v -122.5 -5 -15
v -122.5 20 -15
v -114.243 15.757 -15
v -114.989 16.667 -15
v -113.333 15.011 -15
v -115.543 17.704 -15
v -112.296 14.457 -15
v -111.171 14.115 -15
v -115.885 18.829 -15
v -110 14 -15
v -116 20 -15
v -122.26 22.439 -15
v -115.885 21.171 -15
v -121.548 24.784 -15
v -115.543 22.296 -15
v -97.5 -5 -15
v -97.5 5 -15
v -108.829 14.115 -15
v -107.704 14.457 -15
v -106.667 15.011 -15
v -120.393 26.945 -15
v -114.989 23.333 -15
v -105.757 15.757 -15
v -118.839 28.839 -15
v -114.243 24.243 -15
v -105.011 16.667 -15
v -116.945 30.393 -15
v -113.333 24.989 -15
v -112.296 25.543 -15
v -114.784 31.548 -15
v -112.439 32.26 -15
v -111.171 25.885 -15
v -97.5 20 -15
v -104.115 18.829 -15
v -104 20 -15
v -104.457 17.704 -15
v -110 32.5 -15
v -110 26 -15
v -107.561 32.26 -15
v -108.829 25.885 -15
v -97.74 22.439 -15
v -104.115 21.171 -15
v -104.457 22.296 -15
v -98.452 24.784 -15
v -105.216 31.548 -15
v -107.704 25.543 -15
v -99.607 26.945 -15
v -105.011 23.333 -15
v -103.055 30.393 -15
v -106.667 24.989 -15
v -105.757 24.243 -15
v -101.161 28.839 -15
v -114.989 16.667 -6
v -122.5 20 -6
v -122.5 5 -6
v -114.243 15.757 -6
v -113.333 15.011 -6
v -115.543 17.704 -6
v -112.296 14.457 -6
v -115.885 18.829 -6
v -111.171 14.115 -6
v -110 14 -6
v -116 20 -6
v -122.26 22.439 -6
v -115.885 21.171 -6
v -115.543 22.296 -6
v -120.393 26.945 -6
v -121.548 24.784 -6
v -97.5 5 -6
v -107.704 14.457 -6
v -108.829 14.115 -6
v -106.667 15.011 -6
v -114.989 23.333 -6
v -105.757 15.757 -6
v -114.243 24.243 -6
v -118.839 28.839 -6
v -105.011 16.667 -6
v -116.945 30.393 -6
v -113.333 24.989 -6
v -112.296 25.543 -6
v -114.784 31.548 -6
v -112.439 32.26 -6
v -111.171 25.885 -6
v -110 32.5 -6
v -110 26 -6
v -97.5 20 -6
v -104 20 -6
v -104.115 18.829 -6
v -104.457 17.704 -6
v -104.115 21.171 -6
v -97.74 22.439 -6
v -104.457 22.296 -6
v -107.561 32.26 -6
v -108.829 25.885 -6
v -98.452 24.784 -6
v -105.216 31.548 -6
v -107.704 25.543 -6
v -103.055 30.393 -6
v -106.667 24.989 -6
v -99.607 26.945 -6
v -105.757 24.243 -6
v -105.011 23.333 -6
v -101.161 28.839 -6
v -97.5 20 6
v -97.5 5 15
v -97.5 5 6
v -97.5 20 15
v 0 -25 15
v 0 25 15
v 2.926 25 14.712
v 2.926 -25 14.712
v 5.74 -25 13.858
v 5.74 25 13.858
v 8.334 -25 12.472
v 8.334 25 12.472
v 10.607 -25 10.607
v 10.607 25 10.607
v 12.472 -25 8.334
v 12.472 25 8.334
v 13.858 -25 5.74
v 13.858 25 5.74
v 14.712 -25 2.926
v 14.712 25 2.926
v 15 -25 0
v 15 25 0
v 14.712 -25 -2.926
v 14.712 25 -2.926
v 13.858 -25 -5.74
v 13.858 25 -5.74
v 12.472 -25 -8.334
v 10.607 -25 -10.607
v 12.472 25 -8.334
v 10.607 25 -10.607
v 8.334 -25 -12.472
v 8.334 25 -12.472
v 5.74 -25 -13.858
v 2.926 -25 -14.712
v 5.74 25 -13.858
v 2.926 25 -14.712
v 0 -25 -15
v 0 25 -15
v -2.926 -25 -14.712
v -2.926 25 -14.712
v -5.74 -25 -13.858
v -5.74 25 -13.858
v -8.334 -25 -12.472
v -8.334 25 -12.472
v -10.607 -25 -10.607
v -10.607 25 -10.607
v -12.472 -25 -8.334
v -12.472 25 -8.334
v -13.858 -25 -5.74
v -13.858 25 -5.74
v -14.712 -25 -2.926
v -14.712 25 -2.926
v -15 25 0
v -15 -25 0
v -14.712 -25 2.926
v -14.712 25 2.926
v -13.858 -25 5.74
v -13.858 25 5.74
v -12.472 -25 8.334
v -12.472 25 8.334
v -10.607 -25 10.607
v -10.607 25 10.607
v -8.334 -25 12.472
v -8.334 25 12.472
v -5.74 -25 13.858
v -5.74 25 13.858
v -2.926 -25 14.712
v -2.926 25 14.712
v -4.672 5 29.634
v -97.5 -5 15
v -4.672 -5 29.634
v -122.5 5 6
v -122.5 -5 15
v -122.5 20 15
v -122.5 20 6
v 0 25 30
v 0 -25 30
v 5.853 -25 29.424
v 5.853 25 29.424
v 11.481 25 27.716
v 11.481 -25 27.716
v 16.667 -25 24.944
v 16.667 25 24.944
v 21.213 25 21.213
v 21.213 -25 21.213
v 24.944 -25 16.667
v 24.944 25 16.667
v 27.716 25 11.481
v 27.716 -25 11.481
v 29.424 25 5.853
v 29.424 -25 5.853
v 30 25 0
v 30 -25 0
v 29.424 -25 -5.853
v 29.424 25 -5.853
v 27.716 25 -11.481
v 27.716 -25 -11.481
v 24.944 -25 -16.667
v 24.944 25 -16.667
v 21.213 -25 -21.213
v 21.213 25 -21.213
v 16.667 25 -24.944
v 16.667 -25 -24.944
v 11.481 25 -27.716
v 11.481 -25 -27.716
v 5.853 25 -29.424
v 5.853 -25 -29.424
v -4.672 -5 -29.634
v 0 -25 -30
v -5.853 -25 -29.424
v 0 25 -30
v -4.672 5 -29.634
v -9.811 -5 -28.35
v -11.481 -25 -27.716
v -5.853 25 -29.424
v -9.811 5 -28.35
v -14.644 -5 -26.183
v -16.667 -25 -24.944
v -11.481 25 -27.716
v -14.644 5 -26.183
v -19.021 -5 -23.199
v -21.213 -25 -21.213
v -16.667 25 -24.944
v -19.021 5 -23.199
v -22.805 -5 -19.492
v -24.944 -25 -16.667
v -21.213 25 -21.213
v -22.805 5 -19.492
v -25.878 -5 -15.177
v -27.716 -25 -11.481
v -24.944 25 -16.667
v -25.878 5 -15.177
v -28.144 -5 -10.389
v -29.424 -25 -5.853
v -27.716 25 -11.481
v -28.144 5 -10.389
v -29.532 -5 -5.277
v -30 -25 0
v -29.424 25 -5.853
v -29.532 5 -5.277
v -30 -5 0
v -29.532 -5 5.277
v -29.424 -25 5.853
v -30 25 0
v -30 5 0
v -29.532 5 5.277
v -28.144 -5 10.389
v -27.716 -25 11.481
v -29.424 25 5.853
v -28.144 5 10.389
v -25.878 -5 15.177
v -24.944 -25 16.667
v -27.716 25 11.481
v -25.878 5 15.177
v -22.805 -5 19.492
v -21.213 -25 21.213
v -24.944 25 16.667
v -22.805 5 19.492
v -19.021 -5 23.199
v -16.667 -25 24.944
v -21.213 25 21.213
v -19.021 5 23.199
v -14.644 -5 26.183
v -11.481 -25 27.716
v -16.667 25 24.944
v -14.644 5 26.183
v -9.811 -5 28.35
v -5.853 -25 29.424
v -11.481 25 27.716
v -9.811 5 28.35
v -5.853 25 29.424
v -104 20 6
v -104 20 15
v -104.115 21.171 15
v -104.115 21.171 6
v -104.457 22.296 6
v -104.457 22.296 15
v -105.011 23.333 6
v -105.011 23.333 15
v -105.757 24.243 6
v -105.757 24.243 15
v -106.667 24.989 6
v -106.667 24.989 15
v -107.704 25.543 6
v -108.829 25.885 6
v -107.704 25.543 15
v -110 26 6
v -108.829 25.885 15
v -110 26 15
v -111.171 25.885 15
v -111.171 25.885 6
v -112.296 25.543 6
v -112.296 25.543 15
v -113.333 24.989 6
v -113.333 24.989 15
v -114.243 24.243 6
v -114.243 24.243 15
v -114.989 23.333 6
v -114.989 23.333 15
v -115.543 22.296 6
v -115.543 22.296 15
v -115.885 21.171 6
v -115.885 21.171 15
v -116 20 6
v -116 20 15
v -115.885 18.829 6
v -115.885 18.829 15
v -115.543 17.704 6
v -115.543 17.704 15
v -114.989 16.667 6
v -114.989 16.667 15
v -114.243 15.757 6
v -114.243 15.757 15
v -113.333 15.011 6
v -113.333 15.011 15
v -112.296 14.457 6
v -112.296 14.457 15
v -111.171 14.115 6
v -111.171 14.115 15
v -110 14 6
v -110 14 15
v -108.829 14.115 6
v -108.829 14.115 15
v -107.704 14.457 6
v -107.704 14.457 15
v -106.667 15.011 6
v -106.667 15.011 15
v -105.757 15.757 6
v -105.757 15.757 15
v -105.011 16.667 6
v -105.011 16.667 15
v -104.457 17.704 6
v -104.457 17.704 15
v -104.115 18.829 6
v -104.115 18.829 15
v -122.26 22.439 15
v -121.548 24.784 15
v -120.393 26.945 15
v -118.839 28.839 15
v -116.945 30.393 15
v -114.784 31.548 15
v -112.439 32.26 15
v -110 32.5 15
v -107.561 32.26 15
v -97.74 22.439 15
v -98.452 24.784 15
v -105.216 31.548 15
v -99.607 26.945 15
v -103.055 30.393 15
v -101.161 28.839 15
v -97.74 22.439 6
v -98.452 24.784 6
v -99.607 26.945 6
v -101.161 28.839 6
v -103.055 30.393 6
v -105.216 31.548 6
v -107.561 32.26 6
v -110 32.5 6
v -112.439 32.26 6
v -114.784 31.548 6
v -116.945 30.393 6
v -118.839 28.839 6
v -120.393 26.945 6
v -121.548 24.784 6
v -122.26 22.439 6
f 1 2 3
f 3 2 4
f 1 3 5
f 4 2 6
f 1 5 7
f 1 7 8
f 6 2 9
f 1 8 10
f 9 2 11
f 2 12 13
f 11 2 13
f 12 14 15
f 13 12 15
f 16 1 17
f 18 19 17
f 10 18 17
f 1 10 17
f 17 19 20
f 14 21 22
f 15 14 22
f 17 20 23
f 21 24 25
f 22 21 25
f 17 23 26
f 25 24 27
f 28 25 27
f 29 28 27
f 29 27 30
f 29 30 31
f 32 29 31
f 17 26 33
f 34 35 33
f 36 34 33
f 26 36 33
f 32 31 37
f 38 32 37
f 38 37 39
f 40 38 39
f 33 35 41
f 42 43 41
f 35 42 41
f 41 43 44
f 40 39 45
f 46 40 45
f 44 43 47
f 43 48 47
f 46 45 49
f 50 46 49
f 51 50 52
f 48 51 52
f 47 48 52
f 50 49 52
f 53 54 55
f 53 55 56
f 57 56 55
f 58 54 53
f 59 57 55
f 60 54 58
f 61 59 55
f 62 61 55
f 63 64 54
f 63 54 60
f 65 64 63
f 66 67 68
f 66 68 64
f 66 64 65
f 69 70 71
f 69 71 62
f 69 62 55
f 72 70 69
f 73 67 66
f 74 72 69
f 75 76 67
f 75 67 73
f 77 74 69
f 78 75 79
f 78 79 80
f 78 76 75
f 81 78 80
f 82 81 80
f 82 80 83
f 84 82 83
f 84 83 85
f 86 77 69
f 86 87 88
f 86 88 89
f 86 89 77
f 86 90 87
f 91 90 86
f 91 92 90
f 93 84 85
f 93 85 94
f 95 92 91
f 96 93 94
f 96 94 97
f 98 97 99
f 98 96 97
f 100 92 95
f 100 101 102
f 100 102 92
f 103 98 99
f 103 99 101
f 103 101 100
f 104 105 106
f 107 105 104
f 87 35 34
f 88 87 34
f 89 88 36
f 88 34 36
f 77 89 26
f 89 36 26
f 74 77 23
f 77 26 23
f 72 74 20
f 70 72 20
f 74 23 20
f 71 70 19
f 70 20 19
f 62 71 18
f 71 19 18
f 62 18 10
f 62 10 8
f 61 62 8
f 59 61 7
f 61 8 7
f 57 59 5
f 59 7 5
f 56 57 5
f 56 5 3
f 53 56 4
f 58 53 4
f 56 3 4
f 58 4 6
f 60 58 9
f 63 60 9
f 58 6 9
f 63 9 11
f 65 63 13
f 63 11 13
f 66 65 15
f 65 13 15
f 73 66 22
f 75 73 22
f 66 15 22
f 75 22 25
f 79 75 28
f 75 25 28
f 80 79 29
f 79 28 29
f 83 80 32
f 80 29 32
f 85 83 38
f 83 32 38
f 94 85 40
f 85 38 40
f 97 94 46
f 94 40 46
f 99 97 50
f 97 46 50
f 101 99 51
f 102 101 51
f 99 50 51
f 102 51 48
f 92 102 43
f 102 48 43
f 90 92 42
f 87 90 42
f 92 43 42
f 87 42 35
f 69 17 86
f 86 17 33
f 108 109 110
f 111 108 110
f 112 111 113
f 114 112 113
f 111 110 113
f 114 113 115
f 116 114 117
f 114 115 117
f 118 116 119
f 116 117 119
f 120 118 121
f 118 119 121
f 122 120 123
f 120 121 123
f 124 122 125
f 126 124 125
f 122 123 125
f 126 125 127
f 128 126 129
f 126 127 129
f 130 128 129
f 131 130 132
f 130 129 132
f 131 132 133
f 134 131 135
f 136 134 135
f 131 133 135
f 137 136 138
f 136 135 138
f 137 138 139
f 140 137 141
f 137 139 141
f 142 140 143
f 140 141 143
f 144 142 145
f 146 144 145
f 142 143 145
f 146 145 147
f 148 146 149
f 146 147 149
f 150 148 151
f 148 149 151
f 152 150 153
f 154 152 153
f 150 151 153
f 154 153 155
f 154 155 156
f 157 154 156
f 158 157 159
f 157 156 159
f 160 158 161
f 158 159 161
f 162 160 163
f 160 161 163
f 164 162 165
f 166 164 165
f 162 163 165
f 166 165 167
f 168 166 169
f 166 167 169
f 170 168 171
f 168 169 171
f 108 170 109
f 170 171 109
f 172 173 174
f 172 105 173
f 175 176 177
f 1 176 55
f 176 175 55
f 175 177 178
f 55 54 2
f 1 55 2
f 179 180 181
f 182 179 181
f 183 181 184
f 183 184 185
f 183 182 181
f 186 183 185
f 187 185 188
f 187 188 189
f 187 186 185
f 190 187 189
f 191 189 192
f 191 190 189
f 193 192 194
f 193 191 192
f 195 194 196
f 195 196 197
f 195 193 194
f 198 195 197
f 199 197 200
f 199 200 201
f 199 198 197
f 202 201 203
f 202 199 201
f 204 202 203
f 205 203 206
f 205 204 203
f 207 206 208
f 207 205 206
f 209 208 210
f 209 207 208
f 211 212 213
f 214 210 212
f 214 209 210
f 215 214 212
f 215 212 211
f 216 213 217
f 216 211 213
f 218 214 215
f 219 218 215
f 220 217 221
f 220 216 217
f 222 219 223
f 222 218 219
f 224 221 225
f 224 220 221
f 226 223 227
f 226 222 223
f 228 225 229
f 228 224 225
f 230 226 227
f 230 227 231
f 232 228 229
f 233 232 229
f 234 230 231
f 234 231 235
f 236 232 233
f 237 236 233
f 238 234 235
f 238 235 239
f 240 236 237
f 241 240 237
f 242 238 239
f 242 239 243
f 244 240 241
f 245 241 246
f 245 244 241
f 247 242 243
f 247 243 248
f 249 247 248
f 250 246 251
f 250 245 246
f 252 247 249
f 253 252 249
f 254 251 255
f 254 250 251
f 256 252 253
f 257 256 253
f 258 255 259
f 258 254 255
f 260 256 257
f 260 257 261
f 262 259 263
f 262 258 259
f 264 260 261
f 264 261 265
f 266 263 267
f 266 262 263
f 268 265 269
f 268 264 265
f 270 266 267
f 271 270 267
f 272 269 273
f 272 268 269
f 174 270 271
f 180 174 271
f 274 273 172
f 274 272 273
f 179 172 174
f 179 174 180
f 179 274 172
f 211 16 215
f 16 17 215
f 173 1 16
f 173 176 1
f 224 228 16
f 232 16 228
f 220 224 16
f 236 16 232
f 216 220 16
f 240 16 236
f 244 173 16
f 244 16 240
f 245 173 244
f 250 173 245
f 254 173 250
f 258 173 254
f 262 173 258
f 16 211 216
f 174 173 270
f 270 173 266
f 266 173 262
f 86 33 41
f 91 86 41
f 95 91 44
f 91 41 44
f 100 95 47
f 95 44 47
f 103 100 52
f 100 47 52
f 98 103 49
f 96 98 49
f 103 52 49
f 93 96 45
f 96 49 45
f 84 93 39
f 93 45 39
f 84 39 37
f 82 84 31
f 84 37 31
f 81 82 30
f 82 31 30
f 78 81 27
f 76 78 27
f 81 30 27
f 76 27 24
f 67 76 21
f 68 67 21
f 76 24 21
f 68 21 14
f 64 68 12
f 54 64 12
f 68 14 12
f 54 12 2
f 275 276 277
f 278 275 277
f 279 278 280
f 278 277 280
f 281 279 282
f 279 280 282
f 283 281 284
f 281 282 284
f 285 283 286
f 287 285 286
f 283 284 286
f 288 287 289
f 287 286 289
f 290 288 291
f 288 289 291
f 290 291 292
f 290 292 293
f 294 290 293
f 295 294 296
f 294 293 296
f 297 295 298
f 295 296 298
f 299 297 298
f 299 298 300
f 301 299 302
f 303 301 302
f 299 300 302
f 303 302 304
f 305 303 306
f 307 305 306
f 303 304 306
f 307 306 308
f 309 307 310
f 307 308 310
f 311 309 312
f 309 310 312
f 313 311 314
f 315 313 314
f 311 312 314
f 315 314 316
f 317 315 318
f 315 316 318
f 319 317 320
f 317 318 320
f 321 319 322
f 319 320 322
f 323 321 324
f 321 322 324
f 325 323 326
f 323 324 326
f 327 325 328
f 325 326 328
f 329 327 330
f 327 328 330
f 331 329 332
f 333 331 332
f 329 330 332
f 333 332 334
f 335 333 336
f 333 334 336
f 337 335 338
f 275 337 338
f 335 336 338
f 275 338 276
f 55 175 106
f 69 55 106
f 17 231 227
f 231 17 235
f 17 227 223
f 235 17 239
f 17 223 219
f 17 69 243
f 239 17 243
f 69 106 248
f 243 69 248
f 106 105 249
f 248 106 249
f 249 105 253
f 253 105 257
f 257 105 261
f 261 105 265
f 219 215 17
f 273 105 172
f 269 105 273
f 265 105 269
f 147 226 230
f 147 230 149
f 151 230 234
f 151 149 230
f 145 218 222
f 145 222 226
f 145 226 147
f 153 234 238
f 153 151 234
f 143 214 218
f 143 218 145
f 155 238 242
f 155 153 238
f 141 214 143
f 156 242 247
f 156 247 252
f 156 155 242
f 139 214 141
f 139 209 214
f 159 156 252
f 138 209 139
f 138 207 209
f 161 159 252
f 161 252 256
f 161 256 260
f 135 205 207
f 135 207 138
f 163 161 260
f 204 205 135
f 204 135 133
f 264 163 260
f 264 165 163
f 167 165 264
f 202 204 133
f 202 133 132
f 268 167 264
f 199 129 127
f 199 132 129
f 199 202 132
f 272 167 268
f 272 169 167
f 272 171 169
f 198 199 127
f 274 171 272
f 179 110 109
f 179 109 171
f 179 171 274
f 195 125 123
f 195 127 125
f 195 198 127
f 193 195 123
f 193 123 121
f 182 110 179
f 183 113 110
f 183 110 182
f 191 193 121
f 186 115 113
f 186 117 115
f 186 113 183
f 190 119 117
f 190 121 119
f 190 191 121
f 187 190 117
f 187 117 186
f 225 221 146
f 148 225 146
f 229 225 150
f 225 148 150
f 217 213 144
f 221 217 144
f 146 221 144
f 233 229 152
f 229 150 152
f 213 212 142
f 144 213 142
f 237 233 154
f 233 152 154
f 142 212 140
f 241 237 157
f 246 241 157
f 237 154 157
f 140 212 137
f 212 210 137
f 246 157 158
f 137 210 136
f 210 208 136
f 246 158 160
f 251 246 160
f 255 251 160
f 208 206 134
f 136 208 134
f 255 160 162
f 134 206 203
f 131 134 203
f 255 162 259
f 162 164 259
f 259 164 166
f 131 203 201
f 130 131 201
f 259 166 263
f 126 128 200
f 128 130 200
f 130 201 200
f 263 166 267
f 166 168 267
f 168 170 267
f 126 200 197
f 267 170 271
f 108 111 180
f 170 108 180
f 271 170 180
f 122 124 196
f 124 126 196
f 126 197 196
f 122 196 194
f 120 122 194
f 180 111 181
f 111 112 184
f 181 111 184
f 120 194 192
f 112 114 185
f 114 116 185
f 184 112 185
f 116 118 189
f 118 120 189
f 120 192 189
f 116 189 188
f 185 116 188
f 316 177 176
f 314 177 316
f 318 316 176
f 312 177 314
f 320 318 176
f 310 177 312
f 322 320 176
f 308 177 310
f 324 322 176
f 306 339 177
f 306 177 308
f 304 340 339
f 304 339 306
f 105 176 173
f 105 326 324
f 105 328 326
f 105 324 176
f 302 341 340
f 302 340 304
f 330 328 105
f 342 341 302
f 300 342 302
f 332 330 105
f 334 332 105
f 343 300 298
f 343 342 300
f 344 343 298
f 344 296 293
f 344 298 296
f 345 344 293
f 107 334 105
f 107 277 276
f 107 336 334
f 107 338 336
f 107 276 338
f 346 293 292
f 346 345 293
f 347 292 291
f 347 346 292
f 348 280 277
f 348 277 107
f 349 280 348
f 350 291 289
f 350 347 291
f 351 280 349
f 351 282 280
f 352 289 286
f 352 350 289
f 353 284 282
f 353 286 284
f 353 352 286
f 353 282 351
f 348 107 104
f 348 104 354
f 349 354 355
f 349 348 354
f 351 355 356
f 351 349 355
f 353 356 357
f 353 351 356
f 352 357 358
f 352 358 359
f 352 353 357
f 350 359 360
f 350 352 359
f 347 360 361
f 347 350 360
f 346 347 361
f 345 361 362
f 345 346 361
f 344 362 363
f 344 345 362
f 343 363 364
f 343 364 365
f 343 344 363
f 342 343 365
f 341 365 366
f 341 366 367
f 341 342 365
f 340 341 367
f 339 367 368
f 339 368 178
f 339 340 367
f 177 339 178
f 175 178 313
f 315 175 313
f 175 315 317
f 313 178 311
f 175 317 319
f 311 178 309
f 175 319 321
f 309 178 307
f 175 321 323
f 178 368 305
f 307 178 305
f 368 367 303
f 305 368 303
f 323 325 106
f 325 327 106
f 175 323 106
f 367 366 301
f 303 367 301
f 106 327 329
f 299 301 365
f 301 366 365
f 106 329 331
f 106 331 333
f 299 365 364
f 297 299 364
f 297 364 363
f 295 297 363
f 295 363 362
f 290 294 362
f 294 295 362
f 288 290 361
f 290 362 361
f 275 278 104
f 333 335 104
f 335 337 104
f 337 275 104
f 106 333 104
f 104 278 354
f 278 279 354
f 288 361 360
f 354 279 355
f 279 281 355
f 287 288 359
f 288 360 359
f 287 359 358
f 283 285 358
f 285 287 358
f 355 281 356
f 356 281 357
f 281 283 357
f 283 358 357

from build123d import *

# Parameters (mm, degrees)
BOSS_EXTRUDE2_DEPTH = 5
SKETCH7_R           = 30
BOSS_EXTRUDE3_DEPTH = 25
SKETCH8_R           = 15
CUT_EXTRUDE2_DEPTH  = 50
BOSS_EXTRUDE4_DEPTH = 9
SKETCH10_R          = 6
CUT_EXTRUDE3_DEPTH  = 9
BOSS_EXTRUDE5_DEPTH = 9
SKETCH12_R          = 6
CUT_EXTRUDE4_DEPTH  = 9


with BuildPart() as part:
    # Sketch6 → Boss-Extrude2 (new body, symmetric)
    with BuildSketch(Plane(origin=(0, 0, 0), x_dir=(1, 0, 0), z_dir=(0, 1, 0))):
        with BuildLine():
            Line((-30, 0), (-122.5, 0))
            Line((-122.5, 0), (-122.5, -15))
            Line((-122.5, -15), (-97.5, -15))
            Line((-97.5, -15), (-4.671688756, -29.634023084))
            ThreePointArc((-4.671688756, -29.634023084), (-22.805160191, -19.491656386), (-30, 0))
        make_face()
    boss_extrude2 = extrude(amount=BOSS_EXTRUDE2_DEPTH, both=True)

    # Sketch7 → Boss-Extrude3 (add, symmetric)
    with BuildSketch(Plane(origin=(0, 0, 0), x_dir=(1, 0, 0), z_dir=(0, 1, 0))):
        with Locations(Location((0, 0, 0), (0, 0, 270))):  # turned: the seam where the file's is
            Circle(SKETCH7_R)
    extrude(amount=BOSS_EXTRUDE3_DEPTH, both=True)

    # Sketch8 → Cut-Extrude2 (cut)
    with BuildSketch(Plane(origin=(0, 25, 0), x_dir=(1, 0, 0), z_dir=(0, 1, 0))):
        with Locations(Location((0, 0, 0), (0, 0, 270))):  # turned: the seam where the file's is
            Circle(SKETCH8_R)
    extrude(amount=-CUT_EXTRUDE2_DEPTH, mode=Mode.SUBTRACT)

    # Mirror1: Boss-Extrude2 across plane
    add(boss_extrude2.mirror(Plane(origin=(0, 5, 0), x_dir=(1, 0, 0), z_dir=(0, 0, -1))))

    # Sketch9 → Boss-Extrude4 (add)
    with BuildSketch(Plane.XY.offset(15)):
        with BuildLine():
            Line((-122.5, 5), (-97.5, 5))
            Line((-97.5, 5), (-97.5, 20))
            ThreePointArc((-97.5, 20), (-110, 32.5), (-122.5, 20))
            Line((-122.5, 20), (-122.5, 5))
        make_face()
    extrude(amount=-BOSS_EXTRUDE4_DEPTH)

    # Sketch10 → Cut-Extrude3 (cut)
    with BuildSketch(Plane.XY.offset(15)):
        with Locations((-110, 20)):
            Circle(SKETCH10_R)
    extrude(amount=-CUT_EXTRUDE3_DEPTH, mode=Mode.SUBTRACT)

    # Sketch11 → Boss-Extrude5 (add)
    with BuildSketch(Plane(origin=(0, 0, -15), x_dir=(-1, 0, 0), z_dir=(0, 0, -1))):
        with BuildLine():
            Line((122.5, 5), (97.5, 5))
            Line((97.5, 5), (97.5, 20))
            ThreePointArc((97.5, 20), (110, 32.5), (122.5, 20))
            Line((122.5, 20), (122.5, 5))
        make_face()
    extrude(amount=-BOSS_EXTRUDE5_DEPTH)

    # Sketch12 → Cut-Extrude4 (cut)
    with BuildSketch(Plane(origin=(0, 0, -15), x_dir=(-1, 0, 0), z_dir=(0, 0, -1))):
        with Locations(Location((110, 20, 0), (0, 0, 180))):  # turned: the seam where the file's is
            Circle(SKETCH12_R)
    extrude(amount=-CUT_EXTRUDE4_DEPTH, mode=Mode.SUBTRACT)


solid = part.part
